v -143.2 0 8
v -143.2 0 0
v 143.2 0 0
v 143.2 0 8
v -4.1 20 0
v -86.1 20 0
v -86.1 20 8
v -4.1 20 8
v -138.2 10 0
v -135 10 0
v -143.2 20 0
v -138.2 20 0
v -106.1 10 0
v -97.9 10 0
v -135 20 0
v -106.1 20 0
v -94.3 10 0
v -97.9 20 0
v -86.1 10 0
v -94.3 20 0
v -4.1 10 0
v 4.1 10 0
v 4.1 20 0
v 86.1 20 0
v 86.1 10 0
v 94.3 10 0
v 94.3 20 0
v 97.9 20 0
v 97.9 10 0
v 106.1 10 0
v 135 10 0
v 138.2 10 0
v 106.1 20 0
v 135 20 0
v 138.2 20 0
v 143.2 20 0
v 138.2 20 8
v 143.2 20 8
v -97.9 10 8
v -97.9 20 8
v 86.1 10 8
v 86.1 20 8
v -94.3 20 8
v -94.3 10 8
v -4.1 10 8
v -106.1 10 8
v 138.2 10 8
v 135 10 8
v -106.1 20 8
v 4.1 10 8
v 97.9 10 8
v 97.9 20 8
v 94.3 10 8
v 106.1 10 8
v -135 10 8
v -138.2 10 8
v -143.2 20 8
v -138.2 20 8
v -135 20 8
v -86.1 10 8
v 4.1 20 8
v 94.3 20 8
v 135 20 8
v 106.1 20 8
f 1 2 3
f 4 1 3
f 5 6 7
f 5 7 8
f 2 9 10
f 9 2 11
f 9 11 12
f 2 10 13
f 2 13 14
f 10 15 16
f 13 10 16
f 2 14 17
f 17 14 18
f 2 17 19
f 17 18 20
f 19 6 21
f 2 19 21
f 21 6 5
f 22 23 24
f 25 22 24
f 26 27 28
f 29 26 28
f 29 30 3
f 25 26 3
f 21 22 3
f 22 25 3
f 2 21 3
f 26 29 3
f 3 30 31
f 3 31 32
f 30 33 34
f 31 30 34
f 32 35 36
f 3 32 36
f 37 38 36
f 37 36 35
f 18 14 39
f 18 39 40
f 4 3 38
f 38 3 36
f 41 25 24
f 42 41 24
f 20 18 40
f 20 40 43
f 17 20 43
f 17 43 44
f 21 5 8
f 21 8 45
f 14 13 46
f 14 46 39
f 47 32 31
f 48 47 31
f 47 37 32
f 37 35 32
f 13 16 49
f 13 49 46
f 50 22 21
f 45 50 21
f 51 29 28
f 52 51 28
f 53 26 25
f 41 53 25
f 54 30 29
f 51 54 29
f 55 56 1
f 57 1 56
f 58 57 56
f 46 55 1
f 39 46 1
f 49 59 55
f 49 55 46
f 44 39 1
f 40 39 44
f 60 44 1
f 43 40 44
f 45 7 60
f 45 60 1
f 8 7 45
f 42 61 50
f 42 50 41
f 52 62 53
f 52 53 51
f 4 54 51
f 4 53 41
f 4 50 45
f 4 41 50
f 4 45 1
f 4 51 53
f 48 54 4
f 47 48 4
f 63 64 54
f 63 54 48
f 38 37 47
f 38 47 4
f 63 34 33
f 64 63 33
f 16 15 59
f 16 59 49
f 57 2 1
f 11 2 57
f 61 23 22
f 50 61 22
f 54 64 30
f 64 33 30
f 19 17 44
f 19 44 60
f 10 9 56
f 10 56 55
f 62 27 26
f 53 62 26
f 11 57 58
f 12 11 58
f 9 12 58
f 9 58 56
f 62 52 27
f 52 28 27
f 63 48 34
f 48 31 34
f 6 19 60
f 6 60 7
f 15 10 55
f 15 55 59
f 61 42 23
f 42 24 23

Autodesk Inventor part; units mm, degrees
ref_plane "YZ Plane" through (0, 0, 0) normal (1, 0, 0) x (0, 1, 0)
ref_plane "XZ Plane" through (0, 0, 0) normal (0, 1, 0) x (-1, 0, 0)
ref_plane "XY Plane" through (0, 0, 0) normal (0, 0, 1) x (1, 0, 0)
sketch "Sketch1" plane through (0, 0, 0) normal (0, 0, 1) x (1, 0, 0)
  line L0 (0, 0) -> (143.2, 0)
  line L1 (143.2, 0) -> (143.2, 20)
  line L2 (143.2, 20) -> (138.2, 20)
  line L3 (138.2, 20) -> (138.2, 10)
  line L4 (138.2, 10) -> (135, 10)
  line L5 (135, 10) -> (135, 20)
  line L6 (135, 20) -> (106.1, 20)
  line L7 (106.1, 20) -> (106.1, 10)
  line L8 (106.1, 10) -> (97.9, 10)
  line L9 (97.9, 10) -> (97.9, 20)
  line L10 (97.9, 20) -> (94.3, 20)
  line L11 (94.3, 20) -> (94.3, 10)
  line L12 (94.3, 10) -> (86.1, 10)
  line L13 (86.1, 10) -> (86.1, 20)
  line L14 (86.1, 20) -> (4.1, 20)
  line L15 (4.1, 20) -> (4.1, 10)
  line L16 (4.1, 10) -> (0, 10)
  line L17 (0, 50) -> (0, 0)
  line L18 (0, 0) -> (-143.2, 0)
  line L19 (-143.2, 0) -> (-143.2, 20)
  line L20 (-143.2, 20) -> (-138.2, 20)
  line L21 (-138.2, 20) -> (-138.2, 10)
  line L22 (-138.2, 10) -> (-135, 10)
  line L23 (-135, 10) -> (-135, 20)
  line L24 (-135, 20) -> (-106.1, 20)
  line L25 (-106.1, 20) -> (-106.1, 10)
  line L26 (-106.1, 10) -> (-97.9, 10)
  line L27 (-97.9, 10) -> (-97.9, 20)
  line L28 (-97.9, 20) -> (-94.3, 20)
  line L29 (-94.3, 20) -> (-94.3, 10)
  line L30 (-94.3, 10) -> (-86.1, 10)
  line L31 (-86.1, 10) -> (-86.1, 20)
  line L32 (-86.1, 20) -> (-4.1, 20)
  line L33 (-4.1, 20) -> (-4.1, 10)
  line L34 (-4.1, 10) -> (0, 10)
  dimension "d4" = 3.2
  dimension "d5" = 20
  dimension "d6" = 10
  dimension "d7" = 0
  dimension "d8" = 82
  dimension "d9" = 0
  dimension "d10" = 135
  dimension "d11" = 20
  dimension "d12" = 5
  dimension "d13" = 8.2
  dimension "d14" = 8.2
  dimension "d15" = 4.1
  dimension "d16" = 50
extrude "Extrusion1" add sketch "Sketch1" along normal blind 8
properties part number "brace"
